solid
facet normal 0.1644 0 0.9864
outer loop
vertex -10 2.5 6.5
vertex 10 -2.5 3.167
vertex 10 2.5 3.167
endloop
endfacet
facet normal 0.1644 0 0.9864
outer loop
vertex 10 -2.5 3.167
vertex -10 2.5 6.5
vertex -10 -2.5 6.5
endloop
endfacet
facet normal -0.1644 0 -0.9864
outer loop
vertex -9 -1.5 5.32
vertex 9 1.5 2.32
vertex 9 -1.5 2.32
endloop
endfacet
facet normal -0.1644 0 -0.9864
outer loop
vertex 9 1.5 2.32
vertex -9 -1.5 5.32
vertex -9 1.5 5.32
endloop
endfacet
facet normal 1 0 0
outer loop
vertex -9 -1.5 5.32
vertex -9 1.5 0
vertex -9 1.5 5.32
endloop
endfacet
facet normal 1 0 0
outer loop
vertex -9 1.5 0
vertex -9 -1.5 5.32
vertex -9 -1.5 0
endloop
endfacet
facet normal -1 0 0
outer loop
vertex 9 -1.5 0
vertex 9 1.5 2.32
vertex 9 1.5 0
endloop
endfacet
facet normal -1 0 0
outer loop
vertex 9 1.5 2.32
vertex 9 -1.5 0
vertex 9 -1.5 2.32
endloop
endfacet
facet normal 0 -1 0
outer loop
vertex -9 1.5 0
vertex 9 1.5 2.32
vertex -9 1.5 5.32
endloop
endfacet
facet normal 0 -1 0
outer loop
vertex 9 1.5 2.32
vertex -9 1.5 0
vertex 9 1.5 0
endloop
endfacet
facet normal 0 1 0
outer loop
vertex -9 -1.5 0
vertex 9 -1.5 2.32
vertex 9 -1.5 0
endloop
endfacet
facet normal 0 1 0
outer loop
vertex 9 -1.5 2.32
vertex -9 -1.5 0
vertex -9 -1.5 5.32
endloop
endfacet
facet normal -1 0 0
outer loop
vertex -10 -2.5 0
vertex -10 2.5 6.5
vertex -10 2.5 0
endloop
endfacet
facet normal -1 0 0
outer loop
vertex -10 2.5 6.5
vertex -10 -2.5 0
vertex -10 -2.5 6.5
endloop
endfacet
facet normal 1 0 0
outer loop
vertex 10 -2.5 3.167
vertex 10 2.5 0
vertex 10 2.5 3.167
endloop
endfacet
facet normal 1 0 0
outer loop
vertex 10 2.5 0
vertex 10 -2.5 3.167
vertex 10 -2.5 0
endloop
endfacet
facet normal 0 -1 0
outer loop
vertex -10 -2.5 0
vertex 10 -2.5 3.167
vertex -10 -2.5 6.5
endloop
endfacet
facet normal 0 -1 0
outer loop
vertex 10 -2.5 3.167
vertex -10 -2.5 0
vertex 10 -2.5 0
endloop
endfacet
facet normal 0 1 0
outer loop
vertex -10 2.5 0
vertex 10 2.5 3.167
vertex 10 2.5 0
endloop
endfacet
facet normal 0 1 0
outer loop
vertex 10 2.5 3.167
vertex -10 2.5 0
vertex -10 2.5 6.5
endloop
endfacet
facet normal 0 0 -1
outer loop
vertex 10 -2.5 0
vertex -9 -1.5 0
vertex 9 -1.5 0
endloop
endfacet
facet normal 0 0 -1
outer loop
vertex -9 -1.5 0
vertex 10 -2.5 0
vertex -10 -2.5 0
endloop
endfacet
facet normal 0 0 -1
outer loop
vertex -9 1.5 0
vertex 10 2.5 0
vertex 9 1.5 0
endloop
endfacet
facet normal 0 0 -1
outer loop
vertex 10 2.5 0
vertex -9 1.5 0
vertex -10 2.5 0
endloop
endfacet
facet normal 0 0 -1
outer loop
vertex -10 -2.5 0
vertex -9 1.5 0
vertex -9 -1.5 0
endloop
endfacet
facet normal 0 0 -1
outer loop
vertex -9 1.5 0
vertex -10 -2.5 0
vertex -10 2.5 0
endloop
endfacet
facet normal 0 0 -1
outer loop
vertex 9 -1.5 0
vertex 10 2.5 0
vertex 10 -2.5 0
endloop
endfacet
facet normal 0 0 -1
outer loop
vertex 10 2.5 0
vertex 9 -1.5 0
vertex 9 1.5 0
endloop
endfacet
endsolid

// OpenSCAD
// file: ../p/rect3.scad
use <../lib.scad>
function ldraw_lib__rect3() = [
// 0 Rectangle with 3 Edges
// 0 Name: rect3.dat
// 0 Author: Mark Kennedy [mkennedy]
// 0 !LDRAW_ORG Primitive UPDATE 2010-01
// 0 !LICENSE Licensed under CC BY 4.0 : see CAreadme.txt
// 
// 0 BFC CERTIFY CCW
  [0,"BFC","CERTIFY"],
  [0,"BFC","CCW"],
// 
// 0 !HISTORY 2003-08-01 [PTadmin] Official Update 2003-02
// 0 !HISTORY 2007-06-24 [PTadmin] Header formatted for Contributor Agreement
// 0 !HISTORY 2008-07-01 [PTadmin] Official Update 2008-01
// 0 !HISTORY 2010-01-17 [mikeheide] Change winding to CCW
// 0 !HISTORY 2010-04-05 [PTadmin] Official Update 2010-01
// 
// 
// 2 24 1 0 1 -1 0 1
  [2,24,1,0,1,-1,0,1],
// 2 24 1 0 1 1 0 -1
  [2,24,1,0,1,1,0,-1],
// 2 24 -1 0 1 -1 0 -1
  [2,24,-1,0,1,-1,0,-1],
// 4 16 -1 0 1 -1 0 -1 1 0 -1 1 0 1
  [4,16,-1,0,1,-1,0,-1,1,0,-1,1,0,1],
// 0 //
];
module ldraw_lib__rect3(step=0, col=false, unit=2/5, alt=false, line=0.2, solid=!$preview)
    makepoly(ldraw_lib__rect3(), step=step, col=col, unit=unit, alt=alt, line=line, solid=solid);
ldraw_lib__rect3(line=0.2);
// file: ../p/rect.scad
use <../lib.scad>
function ldraw_lib__rect() = [
// 0 Rectangle
// 0 Name: rect.dat
// 0 Author: James Jessiman
// 0 !LDRAW_ORG Primitive UPDATE 2010-01
// 0 !LICENSE Licensed under CC BY 4.0 : see CAreadme.txt
// 
// 0 BFC CERTIFY CCW
  [0,"BFC","CERTIFY"],
  [0,"BFC","CCW"],
// 
// 0 !HISTORY 2002-04-05 [hafhead] Added BFC statement
// 0 !HISTORY 2002-04-25 [PTadmin] Official Update 2002-02
// 0 !HISTORY 2007-06-24 [PTadmin] Header formatted for Contributor Agreement
// 0 !HISTORY 2008-07-01 [PTadmin] Official Update 2008-01
// 0 !HISTORY 2010-01-17 [mikeheide] changed winding to CCW
// 0 !HISTORY 2010-04-05 [PTadmin] Official Update 2010-01
// 
// 
// 2 24 1 0 1 -1 0 1
  [2,24,1,0,1,-1,0,1],
// 2 24 -1 0 1 -1 0 -1
  [2,24,-1,0,1,-1,0,-1],
// 2 24 -1 0 -1 1 0 -1
  [2,24,-1,0,-1,1,0,-1],
// 2 24 1 0 -1 1 0 1
  [2,24,1,0,-1,1,0,1],
// 4 16 -1 0 1 -1 0 -1 1 0 -1 1 0 1
  [4,16,-1,0,1,-1,0,-1,1,0,-1,1,0,1],
// 0
];
module ldraw_lib__rect(step=0, col=false, unit=2/5, alt=false, line=0.2, solid=!$preview)
    makepoly(ldraw_lib__rect(), step=step, col=col, unit=unit, alt=alt, line=line, solid=solid);
ldraw_lib__rect(line=0.2);
// main file
use <../lib.scad>
use <../p/rect.scad>
use <../p/rect3.scad>
function ldraw_lib__u7033() = [
// 0 Modulex Slope Brick  9  4 x  1
// 0 Name: u7033.dat
// 0 Author: Magnus Forsberg [MagFors]
// 0 !LDRAW_ORG Part UPDATE 2025-09
// 0 !LICENSE Licensed under CC BY 4.0 : see CAreadme.txt
// 
// 0 BFC CERTIFY CCW
  [0,"BFC","CERTIFY"],
  [0,"BFC","CCW"],
// 
// 0 !KEYWORDS 9.4623 degree, Bricklink Mx1561B, Peeron x719, Rebrickable 1561B
// 0 !KEYWORDS slope 1:6
// 
// 0 !HISTORY 2025-06-07 [MagFors] Original design by Tore Eriksson as slp0104a
// 0 !HISTORY 2025-09-29 [OrionP] Official Update 2025-09
// 
// 1 16 0 -12.08335 0 0 0 -25 0 1 -4.16665 6.25 0 0 rect3.dat
  [1,16,0,-12.08335,0,0,0,-25,0,1,-4.16665,6.25,0,0, ldraw_lib__rect3()],
// 1 16 0 -9.55 0 22.5 0 0 3.75 -1 0 0 0 -3.75 rect.dat
  [1,16,0,-9.55,0,22.5,0,0,3.75,-1,0,0,0,-3.75, ldraw_lib__rect()],
// 2 24 -25 0 -6.25 25 0 -6.25
  [2,24,-25,0,-6.25,25,0,-6.25],
// 2 24 -25 0 6.25 25 0 6.25
  [2,24,-25,0,6.25,25,0,6.25],
// 2 24 -22.5 0 -3.75 22.5 0 -3.75
  [2,24,-22.5,0,-3.75,22.5,0,-3.75],
// 2 24 -22.5 0 3.75 22.5 0 3.75
  [2,24,-22.5,0,3.75,22.5,0,3.75],
// 1 16 -22.5 -6.65 0 0 -1 0 0 0 6.65 -3.75 0 0 rect3.dat
  [1,16,-22.5,-6.65,0,0,-1,0,0,0,6.65,-3.75,0,0, ldraw_lib__rect3()],
// 1 16 22.5 -2.9 0 0 1 0 0 0 2.9 3.75 0 0 rect3.dat
  [1,16,22.5,-2.9,0,0,1,0,0,0,2.9,3.75,0,0, ldraw_lib__rect3()],
// 4 16 22.5 0 3.75 22.5 -5.8 3.75 -22.5 -13.3 3.75 -22.5 0 3.75
  [4,16,22.5,0,3.75,22.5,-5.8,3.75,-22.5,-13.3,3.75,-22.5,0,3.75],
// 4 16 -22.5 0 -3.75 -22.5 -13.3 -3.75 22.5 -5.8 -3.75 22.5 0 -3.75
  [4,16,-22.5,0,-3.75,-22.5,-13.3,-3.75,22.5,-5.8,-3.75,22.5,0,-3.75],
// 1 16 -25 -8.125 0 0 1 0 0 0 8.125 6.25 0 0 rect3.dat
  [1,16,-25,-8.125,0,0,1,0,0,0,8.125,6.25,0,0, ldraw_lib__rect3()],
// 1 16 25 -3.95835 0 0 -1 0 -3.95835 0 0 0 0 -6.25 rect.dat
  [1,16,25,-3.95835,0,0,-1,0,-3.95835,0,0,0,0,-6.25, ldraw_lib__rect()],
// 4 16 25 0 -6.25 25 -7.9167 -6.25 -25 -16.25 -6.25 -25 0 -6.25
  [4,16,25,0,-6.25,25,-7.9167,-6.25,-25,-16.25,-6.25,-25,0,-6.25],
// 4 16 -25 0 6.25 -25 -16.25 6.25 25 -7.9167 6.25 25 0 6.25
  [4,16,-25,0,6.25,-25,-16.25,6.25,25,-7.9167,6.25,25,0,6.25],
// 4 16 -22.5 0 -3.75 22.5 0 -3.75 25 0 -6.25 -25 0 -6.25
  [4,16,-22.5,0,-3.75,22.5,0,-3.75,25,0,-6.25,-25,0,-6.25],
// 4 16 25 0 6.25 22.5 0 3.75 -22.5 0 3.75 -25 0 6.25
  [4,16,25,0,6.25,22.5,0,3.75,-22.5,0,3.75,-25,0,6.25],
// 4 16 -25 0 6.25 -22.5 0 3.75 -22.5 0 -3.75 -25 0 -6.25
  [4,16,-25,0,6.25,-22.5,0,3.75,-22.5,0,-3.75,-25,0,-6.25],
// 4 16 22.5 0 -3.75 22.5 0 3.75 25 0 6.25 25 0 -6.25
  [4,16,22.5,0,-3.75,22.5,0,3.75,25,0,6.25,25,0,-6.25],
];
module ldraw_lib__u7033(step=0, col=false, unit=2/5, alt=false, line=0.2, solid=!$preview)
    makepoly(ldraw_lib__u7033(), step=step, col=col, unit=unit, alt=alt, line=line, solid=solid);
ldraw_lib__u7033(line=0.2);
